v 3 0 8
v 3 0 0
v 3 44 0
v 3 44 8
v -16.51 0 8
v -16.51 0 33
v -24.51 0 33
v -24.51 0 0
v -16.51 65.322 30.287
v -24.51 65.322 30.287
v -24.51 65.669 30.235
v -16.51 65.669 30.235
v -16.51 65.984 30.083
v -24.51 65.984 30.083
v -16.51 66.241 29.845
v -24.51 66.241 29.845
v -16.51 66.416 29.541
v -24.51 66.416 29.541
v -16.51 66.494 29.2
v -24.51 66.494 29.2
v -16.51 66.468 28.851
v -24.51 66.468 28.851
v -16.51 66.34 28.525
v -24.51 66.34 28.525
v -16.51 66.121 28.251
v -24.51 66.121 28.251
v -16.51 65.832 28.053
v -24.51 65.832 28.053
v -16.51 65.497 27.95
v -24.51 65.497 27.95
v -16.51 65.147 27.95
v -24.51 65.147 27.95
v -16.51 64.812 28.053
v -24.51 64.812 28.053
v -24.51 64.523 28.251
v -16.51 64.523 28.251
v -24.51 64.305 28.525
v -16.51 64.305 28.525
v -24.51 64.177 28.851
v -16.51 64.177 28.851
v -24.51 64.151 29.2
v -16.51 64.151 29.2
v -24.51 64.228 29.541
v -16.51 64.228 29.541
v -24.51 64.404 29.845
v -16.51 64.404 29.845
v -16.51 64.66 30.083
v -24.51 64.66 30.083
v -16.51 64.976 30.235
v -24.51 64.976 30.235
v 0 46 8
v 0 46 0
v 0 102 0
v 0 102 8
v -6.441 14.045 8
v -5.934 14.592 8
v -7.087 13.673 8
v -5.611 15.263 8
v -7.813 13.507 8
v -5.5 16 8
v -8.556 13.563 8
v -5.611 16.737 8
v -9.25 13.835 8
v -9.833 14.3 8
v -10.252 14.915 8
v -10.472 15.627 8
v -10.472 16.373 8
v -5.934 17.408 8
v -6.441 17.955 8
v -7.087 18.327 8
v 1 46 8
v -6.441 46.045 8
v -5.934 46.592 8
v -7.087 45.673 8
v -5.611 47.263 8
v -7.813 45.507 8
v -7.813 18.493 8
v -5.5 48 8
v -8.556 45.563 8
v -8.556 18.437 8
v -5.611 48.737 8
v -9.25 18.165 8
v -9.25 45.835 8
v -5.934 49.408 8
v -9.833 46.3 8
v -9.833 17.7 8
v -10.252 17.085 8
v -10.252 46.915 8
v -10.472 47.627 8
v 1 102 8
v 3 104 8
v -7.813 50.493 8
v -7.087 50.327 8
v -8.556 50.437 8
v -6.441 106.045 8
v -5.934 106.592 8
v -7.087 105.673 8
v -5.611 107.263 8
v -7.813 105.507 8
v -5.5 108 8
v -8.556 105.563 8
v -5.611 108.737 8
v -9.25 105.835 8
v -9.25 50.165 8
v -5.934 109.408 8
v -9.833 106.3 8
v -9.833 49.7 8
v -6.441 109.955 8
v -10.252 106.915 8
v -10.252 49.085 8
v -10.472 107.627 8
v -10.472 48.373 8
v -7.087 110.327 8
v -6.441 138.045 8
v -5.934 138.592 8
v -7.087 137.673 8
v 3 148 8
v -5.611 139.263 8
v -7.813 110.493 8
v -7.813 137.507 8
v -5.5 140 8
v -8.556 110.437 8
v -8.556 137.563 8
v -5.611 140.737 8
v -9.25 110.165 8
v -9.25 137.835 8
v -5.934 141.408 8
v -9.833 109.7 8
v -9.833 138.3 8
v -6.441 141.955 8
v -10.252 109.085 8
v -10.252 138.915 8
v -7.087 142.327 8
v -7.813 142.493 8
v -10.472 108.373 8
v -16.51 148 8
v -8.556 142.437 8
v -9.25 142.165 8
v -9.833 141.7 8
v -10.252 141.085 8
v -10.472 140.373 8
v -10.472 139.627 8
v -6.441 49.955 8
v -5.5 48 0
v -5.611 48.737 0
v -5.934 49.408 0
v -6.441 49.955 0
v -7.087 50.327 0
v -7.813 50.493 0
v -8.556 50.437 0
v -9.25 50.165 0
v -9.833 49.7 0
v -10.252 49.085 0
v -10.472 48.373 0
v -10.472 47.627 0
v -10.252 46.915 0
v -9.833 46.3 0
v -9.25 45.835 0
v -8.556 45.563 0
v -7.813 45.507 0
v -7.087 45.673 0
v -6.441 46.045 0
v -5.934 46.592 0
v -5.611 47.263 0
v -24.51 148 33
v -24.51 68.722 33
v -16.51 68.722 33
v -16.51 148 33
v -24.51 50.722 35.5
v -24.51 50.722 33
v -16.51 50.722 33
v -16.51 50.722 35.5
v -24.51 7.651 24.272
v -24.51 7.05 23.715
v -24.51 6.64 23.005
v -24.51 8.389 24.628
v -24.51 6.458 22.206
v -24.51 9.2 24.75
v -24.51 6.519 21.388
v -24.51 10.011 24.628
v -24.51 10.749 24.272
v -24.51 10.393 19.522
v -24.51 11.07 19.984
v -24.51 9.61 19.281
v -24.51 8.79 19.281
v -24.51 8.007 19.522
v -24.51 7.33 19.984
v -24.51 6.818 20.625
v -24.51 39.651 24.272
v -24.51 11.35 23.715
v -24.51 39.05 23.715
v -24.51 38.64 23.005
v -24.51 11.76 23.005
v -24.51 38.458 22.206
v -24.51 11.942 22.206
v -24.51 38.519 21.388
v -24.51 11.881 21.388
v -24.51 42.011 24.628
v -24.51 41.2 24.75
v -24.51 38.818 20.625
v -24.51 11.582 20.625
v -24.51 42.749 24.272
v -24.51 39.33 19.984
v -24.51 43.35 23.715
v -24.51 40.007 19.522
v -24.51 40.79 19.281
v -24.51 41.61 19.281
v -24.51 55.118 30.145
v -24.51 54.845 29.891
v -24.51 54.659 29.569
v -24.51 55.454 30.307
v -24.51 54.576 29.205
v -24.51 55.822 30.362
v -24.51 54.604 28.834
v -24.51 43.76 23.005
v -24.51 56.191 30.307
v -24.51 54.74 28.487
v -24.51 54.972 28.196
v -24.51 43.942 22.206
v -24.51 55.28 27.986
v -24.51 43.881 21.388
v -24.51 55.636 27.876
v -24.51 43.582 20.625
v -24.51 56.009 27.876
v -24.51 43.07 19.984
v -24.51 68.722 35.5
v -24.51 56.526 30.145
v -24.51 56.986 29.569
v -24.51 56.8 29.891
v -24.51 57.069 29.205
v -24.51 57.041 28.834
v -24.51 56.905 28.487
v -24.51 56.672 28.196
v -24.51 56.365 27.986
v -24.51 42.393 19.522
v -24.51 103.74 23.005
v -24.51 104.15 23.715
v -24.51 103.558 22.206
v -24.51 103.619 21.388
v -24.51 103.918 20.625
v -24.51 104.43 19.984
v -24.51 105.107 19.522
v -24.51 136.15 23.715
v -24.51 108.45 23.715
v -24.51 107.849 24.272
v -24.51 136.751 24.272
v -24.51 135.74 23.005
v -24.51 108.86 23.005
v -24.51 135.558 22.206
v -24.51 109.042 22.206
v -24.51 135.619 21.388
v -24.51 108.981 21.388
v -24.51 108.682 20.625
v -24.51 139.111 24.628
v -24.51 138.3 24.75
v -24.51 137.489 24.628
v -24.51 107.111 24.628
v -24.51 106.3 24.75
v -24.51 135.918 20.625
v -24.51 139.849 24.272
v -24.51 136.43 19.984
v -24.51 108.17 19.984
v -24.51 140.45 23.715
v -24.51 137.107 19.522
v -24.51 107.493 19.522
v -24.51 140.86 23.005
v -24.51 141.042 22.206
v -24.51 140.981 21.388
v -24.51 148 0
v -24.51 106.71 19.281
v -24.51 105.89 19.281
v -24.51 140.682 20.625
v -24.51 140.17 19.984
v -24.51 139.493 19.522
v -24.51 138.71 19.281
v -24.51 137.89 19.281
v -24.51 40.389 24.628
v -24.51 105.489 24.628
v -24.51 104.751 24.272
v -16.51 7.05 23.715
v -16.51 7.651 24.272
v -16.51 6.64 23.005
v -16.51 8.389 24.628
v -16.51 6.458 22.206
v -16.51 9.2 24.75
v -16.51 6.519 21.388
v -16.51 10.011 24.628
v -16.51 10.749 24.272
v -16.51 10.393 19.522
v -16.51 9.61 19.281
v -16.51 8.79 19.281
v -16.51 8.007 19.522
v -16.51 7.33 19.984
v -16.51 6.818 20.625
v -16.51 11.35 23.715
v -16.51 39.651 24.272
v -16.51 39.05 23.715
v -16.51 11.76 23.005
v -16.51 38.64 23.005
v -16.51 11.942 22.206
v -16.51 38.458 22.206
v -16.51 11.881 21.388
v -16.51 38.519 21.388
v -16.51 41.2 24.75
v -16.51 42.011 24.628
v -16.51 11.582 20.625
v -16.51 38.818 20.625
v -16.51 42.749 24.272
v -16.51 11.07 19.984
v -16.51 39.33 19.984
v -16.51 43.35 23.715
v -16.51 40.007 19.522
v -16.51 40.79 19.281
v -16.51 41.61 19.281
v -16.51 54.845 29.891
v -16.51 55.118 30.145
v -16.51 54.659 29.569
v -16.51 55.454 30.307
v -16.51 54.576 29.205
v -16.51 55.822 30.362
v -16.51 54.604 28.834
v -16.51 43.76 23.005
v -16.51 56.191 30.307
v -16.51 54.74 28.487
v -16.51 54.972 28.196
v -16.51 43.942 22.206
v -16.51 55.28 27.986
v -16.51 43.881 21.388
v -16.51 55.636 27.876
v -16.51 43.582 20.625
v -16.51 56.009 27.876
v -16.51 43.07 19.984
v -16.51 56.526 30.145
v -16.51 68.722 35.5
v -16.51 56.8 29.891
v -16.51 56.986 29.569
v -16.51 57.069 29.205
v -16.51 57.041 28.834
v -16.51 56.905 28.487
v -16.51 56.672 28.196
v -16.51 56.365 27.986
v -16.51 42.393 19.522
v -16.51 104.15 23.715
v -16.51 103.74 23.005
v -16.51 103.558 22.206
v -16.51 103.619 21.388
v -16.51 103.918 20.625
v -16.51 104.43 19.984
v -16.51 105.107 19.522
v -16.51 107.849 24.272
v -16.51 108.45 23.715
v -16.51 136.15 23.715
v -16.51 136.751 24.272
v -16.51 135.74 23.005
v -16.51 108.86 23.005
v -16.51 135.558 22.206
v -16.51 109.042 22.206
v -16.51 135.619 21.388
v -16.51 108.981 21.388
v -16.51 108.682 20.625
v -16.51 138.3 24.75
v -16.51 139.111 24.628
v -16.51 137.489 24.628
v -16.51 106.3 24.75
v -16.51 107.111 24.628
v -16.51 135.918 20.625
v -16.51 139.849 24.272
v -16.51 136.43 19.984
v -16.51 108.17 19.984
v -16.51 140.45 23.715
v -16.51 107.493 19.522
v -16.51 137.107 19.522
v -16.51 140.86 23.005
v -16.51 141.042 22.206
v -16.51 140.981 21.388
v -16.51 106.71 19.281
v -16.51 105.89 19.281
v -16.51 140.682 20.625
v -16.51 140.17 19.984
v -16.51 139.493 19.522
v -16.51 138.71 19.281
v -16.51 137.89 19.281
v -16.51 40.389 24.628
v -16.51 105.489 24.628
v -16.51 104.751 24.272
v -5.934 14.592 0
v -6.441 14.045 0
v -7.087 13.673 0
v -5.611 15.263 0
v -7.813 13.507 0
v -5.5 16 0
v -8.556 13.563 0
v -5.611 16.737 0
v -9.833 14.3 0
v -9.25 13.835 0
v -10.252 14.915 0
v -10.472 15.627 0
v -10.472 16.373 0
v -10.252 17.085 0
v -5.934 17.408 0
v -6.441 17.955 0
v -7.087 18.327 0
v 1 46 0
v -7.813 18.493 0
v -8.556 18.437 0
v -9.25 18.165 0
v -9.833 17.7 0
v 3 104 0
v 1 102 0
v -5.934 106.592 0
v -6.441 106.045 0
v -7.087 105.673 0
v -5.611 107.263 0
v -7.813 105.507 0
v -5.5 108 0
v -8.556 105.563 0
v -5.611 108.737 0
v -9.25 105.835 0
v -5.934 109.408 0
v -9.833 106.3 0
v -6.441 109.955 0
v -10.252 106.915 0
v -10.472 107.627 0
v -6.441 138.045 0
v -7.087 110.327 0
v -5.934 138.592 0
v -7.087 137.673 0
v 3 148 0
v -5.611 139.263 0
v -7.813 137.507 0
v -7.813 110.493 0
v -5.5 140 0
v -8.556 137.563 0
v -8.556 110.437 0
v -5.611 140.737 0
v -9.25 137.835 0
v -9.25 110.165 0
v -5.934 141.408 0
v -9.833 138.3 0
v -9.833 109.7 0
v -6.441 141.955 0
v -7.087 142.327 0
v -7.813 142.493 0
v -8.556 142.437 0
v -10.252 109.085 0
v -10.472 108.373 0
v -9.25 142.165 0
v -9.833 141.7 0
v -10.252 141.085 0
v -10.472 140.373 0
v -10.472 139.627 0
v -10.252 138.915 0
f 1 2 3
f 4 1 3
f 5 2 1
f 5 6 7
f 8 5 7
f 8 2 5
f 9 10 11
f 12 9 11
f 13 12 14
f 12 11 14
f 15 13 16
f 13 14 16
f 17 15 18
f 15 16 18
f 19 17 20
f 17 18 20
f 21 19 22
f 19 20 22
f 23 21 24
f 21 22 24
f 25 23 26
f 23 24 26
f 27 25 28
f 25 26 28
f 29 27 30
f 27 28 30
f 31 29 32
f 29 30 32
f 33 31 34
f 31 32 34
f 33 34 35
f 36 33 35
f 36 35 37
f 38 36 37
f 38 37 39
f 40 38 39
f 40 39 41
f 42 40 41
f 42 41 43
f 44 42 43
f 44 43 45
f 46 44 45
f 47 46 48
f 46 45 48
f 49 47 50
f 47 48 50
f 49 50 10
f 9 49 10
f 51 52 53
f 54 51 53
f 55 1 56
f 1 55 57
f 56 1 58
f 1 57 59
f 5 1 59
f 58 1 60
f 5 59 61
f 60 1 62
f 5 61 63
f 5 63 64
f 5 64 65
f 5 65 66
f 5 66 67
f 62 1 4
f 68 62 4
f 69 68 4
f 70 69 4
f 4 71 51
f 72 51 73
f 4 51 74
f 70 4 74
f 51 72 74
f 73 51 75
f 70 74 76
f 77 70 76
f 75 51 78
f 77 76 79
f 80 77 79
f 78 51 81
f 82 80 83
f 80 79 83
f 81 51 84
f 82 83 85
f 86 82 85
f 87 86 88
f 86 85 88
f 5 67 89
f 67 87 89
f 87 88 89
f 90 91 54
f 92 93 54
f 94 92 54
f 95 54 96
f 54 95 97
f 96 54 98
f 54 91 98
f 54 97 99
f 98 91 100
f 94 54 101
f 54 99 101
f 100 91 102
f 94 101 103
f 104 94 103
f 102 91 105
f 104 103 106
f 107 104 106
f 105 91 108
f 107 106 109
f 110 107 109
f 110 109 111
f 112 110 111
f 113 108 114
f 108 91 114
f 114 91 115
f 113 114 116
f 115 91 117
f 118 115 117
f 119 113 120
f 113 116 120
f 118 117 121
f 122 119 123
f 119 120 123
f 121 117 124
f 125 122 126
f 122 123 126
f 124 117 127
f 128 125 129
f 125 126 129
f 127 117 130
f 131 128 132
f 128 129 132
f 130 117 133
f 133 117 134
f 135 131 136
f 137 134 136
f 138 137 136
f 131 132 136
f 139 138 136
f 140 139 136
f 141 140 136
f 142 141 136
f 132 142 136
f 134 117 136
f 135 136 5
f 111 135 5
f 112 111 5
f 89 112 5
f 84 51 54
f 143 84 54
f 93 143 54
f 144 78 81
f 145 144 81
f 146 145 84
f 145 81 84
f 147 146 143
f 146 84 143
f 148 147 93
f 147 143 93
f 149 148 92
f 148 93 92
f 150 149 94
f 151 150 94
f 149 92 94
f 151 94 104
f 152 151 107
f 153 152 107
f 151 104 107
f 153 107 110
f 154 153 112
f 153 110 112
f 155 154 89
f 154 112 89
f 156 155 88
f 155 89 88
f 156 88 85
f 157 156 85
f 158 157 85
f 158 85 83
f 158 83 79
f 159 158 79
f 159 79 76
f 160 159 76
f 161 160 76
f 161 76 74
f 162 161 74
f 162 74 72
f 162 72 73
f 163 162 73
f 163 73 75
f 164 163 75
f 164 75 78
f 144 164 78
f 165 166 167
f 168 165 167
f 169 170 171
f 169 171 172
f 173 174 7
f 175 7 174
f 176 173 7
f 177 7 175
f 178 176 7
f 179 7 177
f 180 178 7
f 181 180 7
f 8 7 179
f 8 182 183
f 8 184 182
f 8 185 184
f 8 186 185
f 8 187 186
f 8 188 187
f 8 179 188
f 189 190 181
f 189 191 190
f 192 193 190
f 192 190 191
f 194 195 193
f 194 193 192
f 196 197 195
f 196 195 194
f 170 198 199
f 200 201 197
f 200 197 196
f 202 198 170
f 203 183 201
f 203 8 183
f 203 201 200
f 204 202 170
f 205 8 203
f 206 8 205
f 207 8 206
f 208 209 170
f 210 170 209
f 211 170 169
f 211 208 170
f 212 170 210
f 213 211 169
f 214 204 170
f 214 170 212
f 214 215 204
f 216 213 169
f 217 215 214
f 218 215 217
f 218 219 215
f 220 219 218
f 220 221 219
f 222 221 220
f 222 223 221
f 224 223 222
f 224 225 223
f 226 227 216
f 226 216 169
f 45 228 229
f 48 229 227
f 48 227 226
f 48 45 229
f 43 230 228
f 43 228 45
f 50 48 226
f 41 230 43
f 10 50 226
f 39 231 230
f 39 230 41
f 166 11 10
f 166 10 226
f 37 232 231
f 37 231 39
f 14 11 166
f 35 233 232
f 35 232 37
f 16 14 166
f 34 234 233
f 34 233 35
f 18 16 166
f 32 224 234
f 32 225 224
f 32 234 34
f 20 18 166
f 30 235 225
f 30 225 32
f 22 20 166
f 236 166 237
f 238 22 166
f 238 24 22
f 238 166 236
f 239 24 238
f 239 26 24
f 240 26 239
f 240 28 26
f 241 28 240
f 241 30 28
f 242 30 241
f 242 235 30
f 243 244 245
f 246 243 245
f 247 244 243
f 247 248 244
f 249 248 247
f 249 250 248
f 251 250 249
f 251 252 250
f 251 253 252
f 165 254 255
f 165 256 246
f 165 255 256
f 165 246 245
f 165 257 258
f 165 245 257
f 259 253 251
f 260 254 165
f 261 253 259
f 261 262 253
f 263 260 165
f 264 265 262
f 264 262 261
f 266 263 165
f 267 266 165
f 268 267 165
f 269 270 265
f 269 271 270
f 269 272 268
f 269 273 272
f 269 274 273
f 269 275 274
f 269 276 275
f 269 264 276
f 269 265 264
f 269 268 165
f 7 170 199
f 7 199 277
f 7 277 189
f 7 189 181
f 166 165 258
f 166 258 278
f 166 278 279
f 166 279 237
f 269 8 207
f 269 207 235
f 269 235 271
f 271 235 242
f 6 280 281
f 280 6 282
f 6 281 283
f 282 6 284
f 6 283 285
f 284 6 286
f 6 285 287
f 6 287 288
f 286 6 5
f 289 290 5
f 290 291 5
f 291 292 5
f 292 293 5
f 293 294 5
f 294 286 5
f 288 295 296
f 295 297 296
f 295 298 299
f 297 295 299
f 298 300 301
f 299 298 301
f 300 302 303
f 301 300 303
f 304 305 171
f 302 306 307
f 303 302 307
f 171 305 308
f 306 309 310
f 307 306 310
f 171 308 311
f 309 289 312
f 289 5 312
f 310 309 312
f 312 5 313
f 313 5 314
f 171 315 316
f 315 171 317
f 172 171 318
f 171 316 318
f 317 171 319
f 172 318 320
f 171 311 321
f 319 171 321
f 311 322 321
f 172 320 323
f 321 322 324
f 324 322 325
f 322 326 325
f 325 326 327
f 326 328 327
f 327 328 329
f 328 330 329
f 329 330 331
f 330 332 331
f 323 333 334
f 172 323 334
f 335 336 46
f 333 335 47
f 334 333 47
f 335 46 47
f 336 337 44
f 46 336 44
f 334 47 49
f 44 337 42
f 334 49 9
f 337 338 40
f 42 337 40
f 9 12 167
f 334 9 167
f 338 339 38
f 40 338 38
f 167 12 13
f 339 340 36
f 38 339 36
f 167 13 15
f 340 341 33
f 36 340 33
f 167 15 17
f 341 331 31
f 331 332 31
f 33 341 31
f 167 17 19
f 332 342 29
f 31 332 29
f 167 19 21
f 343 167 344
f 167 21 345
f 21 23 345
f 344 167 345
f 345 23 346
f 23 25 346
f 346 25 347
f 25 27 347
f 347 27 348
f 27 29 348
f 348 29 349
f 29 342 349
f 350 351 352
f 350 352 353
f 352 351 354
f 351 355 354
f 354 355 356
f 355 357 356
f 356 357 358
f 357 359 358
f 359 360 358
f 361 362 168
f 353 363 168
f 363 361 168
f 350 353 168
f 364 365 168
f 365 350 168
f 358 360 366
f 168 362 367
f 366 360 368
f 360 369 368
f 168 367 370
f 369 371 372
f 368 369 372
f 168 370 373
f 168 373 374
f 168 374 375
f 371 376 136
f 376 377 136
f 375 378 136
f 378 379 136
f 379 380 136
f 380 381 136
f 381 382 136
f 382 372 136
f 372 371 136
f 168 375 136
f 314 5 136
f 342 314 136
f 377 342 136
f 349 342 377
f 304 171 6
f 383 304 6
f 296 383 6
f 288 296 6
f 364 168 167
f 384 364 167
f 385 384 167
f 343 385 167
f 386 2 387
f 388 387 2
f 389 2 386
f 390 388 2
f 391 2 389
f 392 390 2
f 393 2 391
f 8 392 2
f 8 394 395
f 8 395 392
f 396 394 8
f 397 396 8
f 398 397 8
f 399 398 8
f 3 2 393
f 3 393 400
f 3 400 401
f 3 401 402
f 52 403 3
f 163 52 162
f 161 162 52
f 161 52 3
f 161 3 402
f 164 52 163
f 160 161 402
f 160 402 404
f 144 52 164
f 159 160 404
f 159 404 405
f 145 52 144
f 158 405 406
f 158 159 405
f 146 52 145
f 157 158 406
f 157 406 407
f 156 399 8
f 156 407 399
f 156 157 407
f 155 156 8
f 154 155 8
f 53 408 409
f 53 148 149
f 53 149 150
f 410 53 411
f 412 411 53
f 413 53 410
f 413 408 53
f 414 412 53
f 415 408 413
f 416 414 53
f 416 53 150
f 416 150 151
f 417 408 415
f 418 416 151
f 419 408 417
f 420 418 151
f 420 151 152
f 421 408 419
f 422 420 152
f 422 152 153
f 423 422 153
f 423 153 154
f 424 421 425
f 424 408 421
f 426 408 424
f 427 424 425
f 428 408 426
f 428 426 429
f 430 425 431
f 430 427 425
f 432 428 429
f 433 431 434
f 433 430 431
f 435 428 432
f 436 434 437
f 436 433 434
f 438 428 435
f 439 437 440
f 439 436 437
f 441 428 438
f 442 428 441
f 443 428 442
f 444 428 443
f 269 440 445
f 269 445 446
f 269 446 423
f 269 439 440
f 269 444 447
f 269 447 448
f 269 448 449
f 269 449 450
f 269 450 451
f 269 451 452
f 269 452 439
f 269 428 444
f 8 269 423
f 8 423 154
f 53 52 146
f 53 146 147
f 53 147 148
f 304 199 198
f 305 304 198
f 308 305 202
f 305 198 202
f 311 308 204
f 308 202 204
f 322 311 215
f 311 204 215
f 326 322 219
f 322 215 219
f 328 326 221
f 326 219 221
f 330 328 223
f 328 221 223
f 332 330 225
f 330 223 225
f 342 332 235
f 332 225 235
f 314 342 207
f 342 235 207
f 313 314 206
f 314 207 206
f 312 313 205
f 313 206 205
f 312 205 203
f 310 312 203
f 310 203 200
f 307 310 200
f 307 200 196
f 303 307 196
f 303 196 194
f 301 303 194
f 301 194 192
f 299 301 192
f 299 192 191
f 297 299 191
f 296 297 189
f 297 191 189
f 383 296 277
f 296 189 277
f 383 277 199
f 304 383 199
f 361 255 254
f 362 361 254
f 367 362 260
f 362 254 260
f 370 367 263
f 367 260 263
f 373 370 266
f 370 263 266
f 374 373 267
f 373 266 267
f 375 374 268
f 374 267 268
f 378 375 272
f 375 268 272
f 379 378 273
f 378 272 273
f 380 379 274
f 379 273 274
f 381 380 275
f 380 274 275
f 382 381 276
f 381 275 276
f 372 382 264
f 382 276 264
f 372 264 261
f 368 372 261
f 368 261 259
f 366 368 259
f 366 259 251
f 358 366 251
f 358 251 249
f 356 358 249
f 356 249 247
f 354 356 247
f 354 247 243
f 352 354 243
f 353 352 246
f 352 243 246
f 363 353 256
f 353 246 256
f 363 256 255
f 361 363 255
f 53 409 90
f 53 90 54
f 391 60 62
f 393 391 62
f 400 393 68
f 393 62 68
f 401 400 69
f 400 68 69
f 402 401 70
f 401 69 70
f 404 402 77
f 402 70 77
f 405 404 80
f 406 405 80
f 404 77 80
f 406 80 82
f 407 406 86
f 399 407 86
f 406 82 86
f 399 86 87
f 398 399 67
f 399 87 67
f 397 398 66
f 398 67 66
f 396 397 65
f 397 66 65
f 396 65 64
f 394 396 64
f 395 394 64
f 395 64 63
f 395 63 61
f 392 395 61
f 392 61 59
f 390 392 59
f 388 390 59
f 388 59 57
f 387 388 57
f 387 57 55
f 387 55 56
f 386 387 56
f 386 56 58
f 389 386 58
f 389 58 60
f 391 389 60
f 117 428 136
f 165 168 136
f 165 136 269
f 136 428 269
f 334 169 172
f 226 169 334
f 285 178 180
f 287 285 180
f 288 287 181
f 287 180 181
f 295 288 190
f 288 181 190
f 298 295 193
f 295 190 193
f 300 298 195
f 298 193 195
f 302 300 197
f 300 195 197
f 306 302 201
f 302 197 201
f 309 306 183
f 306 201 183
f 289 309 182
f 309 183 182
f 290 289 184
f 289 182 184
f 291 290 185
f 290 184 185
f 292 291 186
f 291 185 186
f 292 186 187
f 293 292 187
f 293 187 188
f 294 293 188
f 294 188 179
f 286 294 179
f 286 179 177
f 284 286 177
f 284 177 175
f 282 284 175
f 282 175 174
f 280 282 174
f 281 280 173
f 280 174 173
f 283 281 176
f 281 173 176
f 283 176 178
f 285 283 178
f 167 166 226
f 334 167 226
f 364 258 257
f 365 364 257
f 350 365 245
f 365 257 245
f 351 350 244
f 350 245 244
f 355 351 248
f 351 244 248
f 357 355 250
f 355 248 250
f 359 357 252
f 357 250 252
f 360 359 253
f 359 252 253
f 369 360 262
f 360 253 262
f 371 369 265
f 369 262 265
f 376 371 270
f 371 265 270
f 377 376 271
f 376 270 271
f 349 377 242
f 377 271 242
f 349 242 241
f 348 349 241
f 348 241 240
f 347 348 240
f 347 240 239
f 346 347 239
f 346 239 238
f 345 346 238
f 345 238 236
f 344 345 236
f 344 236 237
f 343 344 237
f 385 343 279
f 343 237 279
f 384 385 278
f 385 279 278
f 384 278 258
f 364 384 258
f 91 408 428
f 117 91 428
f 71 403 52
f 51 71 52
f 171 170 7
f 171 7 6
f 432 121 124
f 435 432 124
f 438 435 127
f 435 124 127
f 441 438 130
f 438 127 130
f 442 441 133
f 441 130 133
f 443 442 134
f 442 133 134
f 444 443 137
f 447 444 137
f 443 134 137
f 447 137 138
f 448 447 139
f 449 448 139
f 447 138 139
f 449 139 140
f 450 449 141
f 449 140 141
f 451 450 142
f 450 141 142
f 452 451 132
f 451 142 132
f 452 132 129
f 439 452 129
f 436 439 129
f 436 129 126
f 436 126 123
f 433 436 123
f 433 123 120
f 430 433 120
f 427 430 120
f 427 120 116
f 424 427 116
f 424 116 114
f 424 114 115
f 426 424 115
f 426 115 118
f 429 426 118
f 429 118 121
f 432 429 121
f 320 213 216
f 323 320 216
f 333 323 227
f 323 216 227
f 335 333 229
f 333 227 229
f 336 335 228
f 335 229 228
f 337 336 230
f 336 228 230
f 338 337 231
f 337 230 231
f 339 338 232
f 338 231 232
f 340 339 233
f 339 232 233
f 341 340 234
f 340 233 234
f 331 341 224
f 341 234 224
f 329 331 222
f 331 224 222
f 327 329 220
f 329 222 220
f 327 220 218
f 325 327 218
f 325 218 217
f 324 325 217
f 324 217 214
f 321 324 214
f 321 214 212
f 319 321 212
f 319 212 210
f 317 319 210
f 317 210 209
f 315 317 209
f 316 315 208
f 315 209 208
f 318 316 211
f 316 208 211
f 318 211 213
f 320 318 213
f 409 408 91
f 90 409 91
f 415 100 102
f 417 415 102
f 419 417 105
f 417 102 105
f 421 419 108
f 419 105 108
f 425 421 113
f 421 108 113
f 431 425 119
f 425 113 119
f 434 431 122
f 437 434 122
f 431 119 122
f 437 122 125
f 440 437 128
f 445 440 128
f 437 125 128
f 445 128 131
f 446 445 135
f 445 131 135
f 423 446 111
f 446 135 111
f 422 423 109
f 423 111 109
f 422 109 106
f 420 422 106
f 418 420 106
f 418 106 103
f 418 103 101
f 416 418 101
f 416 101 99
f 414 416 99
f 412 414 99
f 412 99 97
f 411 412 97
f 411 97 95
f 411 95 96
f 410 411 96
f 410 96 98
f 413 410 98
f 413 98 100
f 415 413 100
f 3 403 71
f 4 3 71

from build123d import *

# Parameters (mm, degrees)
SKETCH1_W           = 24.51
SKETCH1_H           = 148
BOSS_EXTRUDE1_DEPTH = 8
SKETCH2_W           = 8
SKETCH2_H           = 148
BOSS_EXTRUDE2_DEPTH = 25
SKETCH3_R           = 2.5
CUT_EXTRUDE1_DEPTH  = 10
SKETCH4_R           = 2.75
CUT_EXTRUDE2_DEPTH  = 8
SKETCH5_W           = 3
SKETCH5_H           = 46
BOSS_EXTRUDE3_DEPTH = 8
SKETCH6_W           = 3
SKETCH6_H           = 46
BOSS_EXTRUDE4_DEPTH = 8
CHAMFER1_SIZE       = 2
SKETCH7_W           = 6
SKETCH7_H           = 18
BOSS_EXTRUDE5_DEPTH = 8
SKETCH8_R           = 1.175
SKETCH8_R_2         = 1.25
CUT_EXTRUDE3_DEPTH  = 8


with BuildPart() as part:
    # Sketch1 → Boss-Extrude1 (new body)
    with BuildSketch(Plane.XY):
        with Locations((-12.255, 74)):
            Rectangle(SKETCH1_W, SKETCH1_H)
    extrude(amount=BOSS_EXTRUDE1_DEPTH)

    # Sketch2 → Boss-Extrude2 (add)
    with BuildSketch(Plane.XY.offset(8)):
        with Locations((-20.51, 74)):
            Rectangle(SKETCH2_W, SKETCH2_H)
    extrude(amount=BOSS_EXTRUDE2_DEPTH)

    # Sketch3 → Cut-Extrude1 (cut)
    with BuildSketch(Plane.XY.offset(8)):
        with Locations((-8, 16)):
            Circle(SKETCH3_R)
        with Locations((-8, 48)):
            Circle(SKETCH3_R)
        with Locations((-8, 108)):
            Circle(SKETCH3_R)
        with Locations((-8, 140)):
            Circle(SKETCH3_R)
    extrude(amount=-CUT_EXTRUDE1_DEPTH, mode=Mode.SUBTRACT)

    # Sketch4 → Cut-Extrude2 (cut)
    with BuildSketch(Plane.ZY.offset(24.51)):
        with Locations((22, 138.3)):
            Circle(SKETCH4_R)
        with Locations((22, 106.3)):
            Circle(SKETCH4_R)
        with Locations((22, 41.2)):
            Circle(SKETCH4_R)
        with Locations((22, 9.2)):
            Circle(SKETCH4_R)
    extrude(amount=-CUT_EXTRUDE2_DEPTH, mode=Mode.SUBTRACT)

    # Sketch5 → Boss-Extrude3 (add)
    with BuildSketch(Plane(origin=(0, 0, 0), x_dir=(-1, 0, 0), z_dir=(0, 0, -1))):
        with Locations((-1.5, 125)):
            Rectangle(SKETCH5_W, SKETCH5_H)
    extrude(amount=-BOSS_EXTRUDE3_DEPTH)

    # Sketch6 → Boss-Extrude4 (add)
    with BuildSketch(Plane(origin=(0, 0, 0), x_dir=(-1, 0, 0), z_dir=(0, 0, -1))):
        with Locations((-1.5, 23)):
            Rectangle(SKETCH6_W, SKETCH6_H)
    extrude(amount=-BOSS_EXTRUDE4_DEPTH)

    # Chamfer1
    chamfer1_edges = [part.edges().sort_by_distance(p)[0] for p in [
        (3, 46, 4),
        (3, 102, 4),
    ]]
    chamfer(chamfer1_edges, length=CHAMFER1_SIZE)

    # Sketch7 → Boss-Extrude5 (add)
    with BuildSketch(Plane.ZY.offset(24.51)):
        with Locations((32.5, 59.722248883)):
            Rectangle(SKETCH7_W, SKETCH7_H)
    extrude(amount=-BOSS_EXTRUDE5_DEPTH)

    # Sketch8 → Cut-Extrude3 (cut)
    with BuildSketch(Plane.ZY.offset(24.51)):
        with Locations((29.112052986, 65.322248883)):
            Circle(SKETCH8_R)
        with Locations((29.112052986, 55.822248883)):
            Circle(SKETCH8_R_2)
    extrude(amount=-CUT_EXTRUDE3_DEPTH, mode=Mode.SUBTRACT)


solid = part.part
